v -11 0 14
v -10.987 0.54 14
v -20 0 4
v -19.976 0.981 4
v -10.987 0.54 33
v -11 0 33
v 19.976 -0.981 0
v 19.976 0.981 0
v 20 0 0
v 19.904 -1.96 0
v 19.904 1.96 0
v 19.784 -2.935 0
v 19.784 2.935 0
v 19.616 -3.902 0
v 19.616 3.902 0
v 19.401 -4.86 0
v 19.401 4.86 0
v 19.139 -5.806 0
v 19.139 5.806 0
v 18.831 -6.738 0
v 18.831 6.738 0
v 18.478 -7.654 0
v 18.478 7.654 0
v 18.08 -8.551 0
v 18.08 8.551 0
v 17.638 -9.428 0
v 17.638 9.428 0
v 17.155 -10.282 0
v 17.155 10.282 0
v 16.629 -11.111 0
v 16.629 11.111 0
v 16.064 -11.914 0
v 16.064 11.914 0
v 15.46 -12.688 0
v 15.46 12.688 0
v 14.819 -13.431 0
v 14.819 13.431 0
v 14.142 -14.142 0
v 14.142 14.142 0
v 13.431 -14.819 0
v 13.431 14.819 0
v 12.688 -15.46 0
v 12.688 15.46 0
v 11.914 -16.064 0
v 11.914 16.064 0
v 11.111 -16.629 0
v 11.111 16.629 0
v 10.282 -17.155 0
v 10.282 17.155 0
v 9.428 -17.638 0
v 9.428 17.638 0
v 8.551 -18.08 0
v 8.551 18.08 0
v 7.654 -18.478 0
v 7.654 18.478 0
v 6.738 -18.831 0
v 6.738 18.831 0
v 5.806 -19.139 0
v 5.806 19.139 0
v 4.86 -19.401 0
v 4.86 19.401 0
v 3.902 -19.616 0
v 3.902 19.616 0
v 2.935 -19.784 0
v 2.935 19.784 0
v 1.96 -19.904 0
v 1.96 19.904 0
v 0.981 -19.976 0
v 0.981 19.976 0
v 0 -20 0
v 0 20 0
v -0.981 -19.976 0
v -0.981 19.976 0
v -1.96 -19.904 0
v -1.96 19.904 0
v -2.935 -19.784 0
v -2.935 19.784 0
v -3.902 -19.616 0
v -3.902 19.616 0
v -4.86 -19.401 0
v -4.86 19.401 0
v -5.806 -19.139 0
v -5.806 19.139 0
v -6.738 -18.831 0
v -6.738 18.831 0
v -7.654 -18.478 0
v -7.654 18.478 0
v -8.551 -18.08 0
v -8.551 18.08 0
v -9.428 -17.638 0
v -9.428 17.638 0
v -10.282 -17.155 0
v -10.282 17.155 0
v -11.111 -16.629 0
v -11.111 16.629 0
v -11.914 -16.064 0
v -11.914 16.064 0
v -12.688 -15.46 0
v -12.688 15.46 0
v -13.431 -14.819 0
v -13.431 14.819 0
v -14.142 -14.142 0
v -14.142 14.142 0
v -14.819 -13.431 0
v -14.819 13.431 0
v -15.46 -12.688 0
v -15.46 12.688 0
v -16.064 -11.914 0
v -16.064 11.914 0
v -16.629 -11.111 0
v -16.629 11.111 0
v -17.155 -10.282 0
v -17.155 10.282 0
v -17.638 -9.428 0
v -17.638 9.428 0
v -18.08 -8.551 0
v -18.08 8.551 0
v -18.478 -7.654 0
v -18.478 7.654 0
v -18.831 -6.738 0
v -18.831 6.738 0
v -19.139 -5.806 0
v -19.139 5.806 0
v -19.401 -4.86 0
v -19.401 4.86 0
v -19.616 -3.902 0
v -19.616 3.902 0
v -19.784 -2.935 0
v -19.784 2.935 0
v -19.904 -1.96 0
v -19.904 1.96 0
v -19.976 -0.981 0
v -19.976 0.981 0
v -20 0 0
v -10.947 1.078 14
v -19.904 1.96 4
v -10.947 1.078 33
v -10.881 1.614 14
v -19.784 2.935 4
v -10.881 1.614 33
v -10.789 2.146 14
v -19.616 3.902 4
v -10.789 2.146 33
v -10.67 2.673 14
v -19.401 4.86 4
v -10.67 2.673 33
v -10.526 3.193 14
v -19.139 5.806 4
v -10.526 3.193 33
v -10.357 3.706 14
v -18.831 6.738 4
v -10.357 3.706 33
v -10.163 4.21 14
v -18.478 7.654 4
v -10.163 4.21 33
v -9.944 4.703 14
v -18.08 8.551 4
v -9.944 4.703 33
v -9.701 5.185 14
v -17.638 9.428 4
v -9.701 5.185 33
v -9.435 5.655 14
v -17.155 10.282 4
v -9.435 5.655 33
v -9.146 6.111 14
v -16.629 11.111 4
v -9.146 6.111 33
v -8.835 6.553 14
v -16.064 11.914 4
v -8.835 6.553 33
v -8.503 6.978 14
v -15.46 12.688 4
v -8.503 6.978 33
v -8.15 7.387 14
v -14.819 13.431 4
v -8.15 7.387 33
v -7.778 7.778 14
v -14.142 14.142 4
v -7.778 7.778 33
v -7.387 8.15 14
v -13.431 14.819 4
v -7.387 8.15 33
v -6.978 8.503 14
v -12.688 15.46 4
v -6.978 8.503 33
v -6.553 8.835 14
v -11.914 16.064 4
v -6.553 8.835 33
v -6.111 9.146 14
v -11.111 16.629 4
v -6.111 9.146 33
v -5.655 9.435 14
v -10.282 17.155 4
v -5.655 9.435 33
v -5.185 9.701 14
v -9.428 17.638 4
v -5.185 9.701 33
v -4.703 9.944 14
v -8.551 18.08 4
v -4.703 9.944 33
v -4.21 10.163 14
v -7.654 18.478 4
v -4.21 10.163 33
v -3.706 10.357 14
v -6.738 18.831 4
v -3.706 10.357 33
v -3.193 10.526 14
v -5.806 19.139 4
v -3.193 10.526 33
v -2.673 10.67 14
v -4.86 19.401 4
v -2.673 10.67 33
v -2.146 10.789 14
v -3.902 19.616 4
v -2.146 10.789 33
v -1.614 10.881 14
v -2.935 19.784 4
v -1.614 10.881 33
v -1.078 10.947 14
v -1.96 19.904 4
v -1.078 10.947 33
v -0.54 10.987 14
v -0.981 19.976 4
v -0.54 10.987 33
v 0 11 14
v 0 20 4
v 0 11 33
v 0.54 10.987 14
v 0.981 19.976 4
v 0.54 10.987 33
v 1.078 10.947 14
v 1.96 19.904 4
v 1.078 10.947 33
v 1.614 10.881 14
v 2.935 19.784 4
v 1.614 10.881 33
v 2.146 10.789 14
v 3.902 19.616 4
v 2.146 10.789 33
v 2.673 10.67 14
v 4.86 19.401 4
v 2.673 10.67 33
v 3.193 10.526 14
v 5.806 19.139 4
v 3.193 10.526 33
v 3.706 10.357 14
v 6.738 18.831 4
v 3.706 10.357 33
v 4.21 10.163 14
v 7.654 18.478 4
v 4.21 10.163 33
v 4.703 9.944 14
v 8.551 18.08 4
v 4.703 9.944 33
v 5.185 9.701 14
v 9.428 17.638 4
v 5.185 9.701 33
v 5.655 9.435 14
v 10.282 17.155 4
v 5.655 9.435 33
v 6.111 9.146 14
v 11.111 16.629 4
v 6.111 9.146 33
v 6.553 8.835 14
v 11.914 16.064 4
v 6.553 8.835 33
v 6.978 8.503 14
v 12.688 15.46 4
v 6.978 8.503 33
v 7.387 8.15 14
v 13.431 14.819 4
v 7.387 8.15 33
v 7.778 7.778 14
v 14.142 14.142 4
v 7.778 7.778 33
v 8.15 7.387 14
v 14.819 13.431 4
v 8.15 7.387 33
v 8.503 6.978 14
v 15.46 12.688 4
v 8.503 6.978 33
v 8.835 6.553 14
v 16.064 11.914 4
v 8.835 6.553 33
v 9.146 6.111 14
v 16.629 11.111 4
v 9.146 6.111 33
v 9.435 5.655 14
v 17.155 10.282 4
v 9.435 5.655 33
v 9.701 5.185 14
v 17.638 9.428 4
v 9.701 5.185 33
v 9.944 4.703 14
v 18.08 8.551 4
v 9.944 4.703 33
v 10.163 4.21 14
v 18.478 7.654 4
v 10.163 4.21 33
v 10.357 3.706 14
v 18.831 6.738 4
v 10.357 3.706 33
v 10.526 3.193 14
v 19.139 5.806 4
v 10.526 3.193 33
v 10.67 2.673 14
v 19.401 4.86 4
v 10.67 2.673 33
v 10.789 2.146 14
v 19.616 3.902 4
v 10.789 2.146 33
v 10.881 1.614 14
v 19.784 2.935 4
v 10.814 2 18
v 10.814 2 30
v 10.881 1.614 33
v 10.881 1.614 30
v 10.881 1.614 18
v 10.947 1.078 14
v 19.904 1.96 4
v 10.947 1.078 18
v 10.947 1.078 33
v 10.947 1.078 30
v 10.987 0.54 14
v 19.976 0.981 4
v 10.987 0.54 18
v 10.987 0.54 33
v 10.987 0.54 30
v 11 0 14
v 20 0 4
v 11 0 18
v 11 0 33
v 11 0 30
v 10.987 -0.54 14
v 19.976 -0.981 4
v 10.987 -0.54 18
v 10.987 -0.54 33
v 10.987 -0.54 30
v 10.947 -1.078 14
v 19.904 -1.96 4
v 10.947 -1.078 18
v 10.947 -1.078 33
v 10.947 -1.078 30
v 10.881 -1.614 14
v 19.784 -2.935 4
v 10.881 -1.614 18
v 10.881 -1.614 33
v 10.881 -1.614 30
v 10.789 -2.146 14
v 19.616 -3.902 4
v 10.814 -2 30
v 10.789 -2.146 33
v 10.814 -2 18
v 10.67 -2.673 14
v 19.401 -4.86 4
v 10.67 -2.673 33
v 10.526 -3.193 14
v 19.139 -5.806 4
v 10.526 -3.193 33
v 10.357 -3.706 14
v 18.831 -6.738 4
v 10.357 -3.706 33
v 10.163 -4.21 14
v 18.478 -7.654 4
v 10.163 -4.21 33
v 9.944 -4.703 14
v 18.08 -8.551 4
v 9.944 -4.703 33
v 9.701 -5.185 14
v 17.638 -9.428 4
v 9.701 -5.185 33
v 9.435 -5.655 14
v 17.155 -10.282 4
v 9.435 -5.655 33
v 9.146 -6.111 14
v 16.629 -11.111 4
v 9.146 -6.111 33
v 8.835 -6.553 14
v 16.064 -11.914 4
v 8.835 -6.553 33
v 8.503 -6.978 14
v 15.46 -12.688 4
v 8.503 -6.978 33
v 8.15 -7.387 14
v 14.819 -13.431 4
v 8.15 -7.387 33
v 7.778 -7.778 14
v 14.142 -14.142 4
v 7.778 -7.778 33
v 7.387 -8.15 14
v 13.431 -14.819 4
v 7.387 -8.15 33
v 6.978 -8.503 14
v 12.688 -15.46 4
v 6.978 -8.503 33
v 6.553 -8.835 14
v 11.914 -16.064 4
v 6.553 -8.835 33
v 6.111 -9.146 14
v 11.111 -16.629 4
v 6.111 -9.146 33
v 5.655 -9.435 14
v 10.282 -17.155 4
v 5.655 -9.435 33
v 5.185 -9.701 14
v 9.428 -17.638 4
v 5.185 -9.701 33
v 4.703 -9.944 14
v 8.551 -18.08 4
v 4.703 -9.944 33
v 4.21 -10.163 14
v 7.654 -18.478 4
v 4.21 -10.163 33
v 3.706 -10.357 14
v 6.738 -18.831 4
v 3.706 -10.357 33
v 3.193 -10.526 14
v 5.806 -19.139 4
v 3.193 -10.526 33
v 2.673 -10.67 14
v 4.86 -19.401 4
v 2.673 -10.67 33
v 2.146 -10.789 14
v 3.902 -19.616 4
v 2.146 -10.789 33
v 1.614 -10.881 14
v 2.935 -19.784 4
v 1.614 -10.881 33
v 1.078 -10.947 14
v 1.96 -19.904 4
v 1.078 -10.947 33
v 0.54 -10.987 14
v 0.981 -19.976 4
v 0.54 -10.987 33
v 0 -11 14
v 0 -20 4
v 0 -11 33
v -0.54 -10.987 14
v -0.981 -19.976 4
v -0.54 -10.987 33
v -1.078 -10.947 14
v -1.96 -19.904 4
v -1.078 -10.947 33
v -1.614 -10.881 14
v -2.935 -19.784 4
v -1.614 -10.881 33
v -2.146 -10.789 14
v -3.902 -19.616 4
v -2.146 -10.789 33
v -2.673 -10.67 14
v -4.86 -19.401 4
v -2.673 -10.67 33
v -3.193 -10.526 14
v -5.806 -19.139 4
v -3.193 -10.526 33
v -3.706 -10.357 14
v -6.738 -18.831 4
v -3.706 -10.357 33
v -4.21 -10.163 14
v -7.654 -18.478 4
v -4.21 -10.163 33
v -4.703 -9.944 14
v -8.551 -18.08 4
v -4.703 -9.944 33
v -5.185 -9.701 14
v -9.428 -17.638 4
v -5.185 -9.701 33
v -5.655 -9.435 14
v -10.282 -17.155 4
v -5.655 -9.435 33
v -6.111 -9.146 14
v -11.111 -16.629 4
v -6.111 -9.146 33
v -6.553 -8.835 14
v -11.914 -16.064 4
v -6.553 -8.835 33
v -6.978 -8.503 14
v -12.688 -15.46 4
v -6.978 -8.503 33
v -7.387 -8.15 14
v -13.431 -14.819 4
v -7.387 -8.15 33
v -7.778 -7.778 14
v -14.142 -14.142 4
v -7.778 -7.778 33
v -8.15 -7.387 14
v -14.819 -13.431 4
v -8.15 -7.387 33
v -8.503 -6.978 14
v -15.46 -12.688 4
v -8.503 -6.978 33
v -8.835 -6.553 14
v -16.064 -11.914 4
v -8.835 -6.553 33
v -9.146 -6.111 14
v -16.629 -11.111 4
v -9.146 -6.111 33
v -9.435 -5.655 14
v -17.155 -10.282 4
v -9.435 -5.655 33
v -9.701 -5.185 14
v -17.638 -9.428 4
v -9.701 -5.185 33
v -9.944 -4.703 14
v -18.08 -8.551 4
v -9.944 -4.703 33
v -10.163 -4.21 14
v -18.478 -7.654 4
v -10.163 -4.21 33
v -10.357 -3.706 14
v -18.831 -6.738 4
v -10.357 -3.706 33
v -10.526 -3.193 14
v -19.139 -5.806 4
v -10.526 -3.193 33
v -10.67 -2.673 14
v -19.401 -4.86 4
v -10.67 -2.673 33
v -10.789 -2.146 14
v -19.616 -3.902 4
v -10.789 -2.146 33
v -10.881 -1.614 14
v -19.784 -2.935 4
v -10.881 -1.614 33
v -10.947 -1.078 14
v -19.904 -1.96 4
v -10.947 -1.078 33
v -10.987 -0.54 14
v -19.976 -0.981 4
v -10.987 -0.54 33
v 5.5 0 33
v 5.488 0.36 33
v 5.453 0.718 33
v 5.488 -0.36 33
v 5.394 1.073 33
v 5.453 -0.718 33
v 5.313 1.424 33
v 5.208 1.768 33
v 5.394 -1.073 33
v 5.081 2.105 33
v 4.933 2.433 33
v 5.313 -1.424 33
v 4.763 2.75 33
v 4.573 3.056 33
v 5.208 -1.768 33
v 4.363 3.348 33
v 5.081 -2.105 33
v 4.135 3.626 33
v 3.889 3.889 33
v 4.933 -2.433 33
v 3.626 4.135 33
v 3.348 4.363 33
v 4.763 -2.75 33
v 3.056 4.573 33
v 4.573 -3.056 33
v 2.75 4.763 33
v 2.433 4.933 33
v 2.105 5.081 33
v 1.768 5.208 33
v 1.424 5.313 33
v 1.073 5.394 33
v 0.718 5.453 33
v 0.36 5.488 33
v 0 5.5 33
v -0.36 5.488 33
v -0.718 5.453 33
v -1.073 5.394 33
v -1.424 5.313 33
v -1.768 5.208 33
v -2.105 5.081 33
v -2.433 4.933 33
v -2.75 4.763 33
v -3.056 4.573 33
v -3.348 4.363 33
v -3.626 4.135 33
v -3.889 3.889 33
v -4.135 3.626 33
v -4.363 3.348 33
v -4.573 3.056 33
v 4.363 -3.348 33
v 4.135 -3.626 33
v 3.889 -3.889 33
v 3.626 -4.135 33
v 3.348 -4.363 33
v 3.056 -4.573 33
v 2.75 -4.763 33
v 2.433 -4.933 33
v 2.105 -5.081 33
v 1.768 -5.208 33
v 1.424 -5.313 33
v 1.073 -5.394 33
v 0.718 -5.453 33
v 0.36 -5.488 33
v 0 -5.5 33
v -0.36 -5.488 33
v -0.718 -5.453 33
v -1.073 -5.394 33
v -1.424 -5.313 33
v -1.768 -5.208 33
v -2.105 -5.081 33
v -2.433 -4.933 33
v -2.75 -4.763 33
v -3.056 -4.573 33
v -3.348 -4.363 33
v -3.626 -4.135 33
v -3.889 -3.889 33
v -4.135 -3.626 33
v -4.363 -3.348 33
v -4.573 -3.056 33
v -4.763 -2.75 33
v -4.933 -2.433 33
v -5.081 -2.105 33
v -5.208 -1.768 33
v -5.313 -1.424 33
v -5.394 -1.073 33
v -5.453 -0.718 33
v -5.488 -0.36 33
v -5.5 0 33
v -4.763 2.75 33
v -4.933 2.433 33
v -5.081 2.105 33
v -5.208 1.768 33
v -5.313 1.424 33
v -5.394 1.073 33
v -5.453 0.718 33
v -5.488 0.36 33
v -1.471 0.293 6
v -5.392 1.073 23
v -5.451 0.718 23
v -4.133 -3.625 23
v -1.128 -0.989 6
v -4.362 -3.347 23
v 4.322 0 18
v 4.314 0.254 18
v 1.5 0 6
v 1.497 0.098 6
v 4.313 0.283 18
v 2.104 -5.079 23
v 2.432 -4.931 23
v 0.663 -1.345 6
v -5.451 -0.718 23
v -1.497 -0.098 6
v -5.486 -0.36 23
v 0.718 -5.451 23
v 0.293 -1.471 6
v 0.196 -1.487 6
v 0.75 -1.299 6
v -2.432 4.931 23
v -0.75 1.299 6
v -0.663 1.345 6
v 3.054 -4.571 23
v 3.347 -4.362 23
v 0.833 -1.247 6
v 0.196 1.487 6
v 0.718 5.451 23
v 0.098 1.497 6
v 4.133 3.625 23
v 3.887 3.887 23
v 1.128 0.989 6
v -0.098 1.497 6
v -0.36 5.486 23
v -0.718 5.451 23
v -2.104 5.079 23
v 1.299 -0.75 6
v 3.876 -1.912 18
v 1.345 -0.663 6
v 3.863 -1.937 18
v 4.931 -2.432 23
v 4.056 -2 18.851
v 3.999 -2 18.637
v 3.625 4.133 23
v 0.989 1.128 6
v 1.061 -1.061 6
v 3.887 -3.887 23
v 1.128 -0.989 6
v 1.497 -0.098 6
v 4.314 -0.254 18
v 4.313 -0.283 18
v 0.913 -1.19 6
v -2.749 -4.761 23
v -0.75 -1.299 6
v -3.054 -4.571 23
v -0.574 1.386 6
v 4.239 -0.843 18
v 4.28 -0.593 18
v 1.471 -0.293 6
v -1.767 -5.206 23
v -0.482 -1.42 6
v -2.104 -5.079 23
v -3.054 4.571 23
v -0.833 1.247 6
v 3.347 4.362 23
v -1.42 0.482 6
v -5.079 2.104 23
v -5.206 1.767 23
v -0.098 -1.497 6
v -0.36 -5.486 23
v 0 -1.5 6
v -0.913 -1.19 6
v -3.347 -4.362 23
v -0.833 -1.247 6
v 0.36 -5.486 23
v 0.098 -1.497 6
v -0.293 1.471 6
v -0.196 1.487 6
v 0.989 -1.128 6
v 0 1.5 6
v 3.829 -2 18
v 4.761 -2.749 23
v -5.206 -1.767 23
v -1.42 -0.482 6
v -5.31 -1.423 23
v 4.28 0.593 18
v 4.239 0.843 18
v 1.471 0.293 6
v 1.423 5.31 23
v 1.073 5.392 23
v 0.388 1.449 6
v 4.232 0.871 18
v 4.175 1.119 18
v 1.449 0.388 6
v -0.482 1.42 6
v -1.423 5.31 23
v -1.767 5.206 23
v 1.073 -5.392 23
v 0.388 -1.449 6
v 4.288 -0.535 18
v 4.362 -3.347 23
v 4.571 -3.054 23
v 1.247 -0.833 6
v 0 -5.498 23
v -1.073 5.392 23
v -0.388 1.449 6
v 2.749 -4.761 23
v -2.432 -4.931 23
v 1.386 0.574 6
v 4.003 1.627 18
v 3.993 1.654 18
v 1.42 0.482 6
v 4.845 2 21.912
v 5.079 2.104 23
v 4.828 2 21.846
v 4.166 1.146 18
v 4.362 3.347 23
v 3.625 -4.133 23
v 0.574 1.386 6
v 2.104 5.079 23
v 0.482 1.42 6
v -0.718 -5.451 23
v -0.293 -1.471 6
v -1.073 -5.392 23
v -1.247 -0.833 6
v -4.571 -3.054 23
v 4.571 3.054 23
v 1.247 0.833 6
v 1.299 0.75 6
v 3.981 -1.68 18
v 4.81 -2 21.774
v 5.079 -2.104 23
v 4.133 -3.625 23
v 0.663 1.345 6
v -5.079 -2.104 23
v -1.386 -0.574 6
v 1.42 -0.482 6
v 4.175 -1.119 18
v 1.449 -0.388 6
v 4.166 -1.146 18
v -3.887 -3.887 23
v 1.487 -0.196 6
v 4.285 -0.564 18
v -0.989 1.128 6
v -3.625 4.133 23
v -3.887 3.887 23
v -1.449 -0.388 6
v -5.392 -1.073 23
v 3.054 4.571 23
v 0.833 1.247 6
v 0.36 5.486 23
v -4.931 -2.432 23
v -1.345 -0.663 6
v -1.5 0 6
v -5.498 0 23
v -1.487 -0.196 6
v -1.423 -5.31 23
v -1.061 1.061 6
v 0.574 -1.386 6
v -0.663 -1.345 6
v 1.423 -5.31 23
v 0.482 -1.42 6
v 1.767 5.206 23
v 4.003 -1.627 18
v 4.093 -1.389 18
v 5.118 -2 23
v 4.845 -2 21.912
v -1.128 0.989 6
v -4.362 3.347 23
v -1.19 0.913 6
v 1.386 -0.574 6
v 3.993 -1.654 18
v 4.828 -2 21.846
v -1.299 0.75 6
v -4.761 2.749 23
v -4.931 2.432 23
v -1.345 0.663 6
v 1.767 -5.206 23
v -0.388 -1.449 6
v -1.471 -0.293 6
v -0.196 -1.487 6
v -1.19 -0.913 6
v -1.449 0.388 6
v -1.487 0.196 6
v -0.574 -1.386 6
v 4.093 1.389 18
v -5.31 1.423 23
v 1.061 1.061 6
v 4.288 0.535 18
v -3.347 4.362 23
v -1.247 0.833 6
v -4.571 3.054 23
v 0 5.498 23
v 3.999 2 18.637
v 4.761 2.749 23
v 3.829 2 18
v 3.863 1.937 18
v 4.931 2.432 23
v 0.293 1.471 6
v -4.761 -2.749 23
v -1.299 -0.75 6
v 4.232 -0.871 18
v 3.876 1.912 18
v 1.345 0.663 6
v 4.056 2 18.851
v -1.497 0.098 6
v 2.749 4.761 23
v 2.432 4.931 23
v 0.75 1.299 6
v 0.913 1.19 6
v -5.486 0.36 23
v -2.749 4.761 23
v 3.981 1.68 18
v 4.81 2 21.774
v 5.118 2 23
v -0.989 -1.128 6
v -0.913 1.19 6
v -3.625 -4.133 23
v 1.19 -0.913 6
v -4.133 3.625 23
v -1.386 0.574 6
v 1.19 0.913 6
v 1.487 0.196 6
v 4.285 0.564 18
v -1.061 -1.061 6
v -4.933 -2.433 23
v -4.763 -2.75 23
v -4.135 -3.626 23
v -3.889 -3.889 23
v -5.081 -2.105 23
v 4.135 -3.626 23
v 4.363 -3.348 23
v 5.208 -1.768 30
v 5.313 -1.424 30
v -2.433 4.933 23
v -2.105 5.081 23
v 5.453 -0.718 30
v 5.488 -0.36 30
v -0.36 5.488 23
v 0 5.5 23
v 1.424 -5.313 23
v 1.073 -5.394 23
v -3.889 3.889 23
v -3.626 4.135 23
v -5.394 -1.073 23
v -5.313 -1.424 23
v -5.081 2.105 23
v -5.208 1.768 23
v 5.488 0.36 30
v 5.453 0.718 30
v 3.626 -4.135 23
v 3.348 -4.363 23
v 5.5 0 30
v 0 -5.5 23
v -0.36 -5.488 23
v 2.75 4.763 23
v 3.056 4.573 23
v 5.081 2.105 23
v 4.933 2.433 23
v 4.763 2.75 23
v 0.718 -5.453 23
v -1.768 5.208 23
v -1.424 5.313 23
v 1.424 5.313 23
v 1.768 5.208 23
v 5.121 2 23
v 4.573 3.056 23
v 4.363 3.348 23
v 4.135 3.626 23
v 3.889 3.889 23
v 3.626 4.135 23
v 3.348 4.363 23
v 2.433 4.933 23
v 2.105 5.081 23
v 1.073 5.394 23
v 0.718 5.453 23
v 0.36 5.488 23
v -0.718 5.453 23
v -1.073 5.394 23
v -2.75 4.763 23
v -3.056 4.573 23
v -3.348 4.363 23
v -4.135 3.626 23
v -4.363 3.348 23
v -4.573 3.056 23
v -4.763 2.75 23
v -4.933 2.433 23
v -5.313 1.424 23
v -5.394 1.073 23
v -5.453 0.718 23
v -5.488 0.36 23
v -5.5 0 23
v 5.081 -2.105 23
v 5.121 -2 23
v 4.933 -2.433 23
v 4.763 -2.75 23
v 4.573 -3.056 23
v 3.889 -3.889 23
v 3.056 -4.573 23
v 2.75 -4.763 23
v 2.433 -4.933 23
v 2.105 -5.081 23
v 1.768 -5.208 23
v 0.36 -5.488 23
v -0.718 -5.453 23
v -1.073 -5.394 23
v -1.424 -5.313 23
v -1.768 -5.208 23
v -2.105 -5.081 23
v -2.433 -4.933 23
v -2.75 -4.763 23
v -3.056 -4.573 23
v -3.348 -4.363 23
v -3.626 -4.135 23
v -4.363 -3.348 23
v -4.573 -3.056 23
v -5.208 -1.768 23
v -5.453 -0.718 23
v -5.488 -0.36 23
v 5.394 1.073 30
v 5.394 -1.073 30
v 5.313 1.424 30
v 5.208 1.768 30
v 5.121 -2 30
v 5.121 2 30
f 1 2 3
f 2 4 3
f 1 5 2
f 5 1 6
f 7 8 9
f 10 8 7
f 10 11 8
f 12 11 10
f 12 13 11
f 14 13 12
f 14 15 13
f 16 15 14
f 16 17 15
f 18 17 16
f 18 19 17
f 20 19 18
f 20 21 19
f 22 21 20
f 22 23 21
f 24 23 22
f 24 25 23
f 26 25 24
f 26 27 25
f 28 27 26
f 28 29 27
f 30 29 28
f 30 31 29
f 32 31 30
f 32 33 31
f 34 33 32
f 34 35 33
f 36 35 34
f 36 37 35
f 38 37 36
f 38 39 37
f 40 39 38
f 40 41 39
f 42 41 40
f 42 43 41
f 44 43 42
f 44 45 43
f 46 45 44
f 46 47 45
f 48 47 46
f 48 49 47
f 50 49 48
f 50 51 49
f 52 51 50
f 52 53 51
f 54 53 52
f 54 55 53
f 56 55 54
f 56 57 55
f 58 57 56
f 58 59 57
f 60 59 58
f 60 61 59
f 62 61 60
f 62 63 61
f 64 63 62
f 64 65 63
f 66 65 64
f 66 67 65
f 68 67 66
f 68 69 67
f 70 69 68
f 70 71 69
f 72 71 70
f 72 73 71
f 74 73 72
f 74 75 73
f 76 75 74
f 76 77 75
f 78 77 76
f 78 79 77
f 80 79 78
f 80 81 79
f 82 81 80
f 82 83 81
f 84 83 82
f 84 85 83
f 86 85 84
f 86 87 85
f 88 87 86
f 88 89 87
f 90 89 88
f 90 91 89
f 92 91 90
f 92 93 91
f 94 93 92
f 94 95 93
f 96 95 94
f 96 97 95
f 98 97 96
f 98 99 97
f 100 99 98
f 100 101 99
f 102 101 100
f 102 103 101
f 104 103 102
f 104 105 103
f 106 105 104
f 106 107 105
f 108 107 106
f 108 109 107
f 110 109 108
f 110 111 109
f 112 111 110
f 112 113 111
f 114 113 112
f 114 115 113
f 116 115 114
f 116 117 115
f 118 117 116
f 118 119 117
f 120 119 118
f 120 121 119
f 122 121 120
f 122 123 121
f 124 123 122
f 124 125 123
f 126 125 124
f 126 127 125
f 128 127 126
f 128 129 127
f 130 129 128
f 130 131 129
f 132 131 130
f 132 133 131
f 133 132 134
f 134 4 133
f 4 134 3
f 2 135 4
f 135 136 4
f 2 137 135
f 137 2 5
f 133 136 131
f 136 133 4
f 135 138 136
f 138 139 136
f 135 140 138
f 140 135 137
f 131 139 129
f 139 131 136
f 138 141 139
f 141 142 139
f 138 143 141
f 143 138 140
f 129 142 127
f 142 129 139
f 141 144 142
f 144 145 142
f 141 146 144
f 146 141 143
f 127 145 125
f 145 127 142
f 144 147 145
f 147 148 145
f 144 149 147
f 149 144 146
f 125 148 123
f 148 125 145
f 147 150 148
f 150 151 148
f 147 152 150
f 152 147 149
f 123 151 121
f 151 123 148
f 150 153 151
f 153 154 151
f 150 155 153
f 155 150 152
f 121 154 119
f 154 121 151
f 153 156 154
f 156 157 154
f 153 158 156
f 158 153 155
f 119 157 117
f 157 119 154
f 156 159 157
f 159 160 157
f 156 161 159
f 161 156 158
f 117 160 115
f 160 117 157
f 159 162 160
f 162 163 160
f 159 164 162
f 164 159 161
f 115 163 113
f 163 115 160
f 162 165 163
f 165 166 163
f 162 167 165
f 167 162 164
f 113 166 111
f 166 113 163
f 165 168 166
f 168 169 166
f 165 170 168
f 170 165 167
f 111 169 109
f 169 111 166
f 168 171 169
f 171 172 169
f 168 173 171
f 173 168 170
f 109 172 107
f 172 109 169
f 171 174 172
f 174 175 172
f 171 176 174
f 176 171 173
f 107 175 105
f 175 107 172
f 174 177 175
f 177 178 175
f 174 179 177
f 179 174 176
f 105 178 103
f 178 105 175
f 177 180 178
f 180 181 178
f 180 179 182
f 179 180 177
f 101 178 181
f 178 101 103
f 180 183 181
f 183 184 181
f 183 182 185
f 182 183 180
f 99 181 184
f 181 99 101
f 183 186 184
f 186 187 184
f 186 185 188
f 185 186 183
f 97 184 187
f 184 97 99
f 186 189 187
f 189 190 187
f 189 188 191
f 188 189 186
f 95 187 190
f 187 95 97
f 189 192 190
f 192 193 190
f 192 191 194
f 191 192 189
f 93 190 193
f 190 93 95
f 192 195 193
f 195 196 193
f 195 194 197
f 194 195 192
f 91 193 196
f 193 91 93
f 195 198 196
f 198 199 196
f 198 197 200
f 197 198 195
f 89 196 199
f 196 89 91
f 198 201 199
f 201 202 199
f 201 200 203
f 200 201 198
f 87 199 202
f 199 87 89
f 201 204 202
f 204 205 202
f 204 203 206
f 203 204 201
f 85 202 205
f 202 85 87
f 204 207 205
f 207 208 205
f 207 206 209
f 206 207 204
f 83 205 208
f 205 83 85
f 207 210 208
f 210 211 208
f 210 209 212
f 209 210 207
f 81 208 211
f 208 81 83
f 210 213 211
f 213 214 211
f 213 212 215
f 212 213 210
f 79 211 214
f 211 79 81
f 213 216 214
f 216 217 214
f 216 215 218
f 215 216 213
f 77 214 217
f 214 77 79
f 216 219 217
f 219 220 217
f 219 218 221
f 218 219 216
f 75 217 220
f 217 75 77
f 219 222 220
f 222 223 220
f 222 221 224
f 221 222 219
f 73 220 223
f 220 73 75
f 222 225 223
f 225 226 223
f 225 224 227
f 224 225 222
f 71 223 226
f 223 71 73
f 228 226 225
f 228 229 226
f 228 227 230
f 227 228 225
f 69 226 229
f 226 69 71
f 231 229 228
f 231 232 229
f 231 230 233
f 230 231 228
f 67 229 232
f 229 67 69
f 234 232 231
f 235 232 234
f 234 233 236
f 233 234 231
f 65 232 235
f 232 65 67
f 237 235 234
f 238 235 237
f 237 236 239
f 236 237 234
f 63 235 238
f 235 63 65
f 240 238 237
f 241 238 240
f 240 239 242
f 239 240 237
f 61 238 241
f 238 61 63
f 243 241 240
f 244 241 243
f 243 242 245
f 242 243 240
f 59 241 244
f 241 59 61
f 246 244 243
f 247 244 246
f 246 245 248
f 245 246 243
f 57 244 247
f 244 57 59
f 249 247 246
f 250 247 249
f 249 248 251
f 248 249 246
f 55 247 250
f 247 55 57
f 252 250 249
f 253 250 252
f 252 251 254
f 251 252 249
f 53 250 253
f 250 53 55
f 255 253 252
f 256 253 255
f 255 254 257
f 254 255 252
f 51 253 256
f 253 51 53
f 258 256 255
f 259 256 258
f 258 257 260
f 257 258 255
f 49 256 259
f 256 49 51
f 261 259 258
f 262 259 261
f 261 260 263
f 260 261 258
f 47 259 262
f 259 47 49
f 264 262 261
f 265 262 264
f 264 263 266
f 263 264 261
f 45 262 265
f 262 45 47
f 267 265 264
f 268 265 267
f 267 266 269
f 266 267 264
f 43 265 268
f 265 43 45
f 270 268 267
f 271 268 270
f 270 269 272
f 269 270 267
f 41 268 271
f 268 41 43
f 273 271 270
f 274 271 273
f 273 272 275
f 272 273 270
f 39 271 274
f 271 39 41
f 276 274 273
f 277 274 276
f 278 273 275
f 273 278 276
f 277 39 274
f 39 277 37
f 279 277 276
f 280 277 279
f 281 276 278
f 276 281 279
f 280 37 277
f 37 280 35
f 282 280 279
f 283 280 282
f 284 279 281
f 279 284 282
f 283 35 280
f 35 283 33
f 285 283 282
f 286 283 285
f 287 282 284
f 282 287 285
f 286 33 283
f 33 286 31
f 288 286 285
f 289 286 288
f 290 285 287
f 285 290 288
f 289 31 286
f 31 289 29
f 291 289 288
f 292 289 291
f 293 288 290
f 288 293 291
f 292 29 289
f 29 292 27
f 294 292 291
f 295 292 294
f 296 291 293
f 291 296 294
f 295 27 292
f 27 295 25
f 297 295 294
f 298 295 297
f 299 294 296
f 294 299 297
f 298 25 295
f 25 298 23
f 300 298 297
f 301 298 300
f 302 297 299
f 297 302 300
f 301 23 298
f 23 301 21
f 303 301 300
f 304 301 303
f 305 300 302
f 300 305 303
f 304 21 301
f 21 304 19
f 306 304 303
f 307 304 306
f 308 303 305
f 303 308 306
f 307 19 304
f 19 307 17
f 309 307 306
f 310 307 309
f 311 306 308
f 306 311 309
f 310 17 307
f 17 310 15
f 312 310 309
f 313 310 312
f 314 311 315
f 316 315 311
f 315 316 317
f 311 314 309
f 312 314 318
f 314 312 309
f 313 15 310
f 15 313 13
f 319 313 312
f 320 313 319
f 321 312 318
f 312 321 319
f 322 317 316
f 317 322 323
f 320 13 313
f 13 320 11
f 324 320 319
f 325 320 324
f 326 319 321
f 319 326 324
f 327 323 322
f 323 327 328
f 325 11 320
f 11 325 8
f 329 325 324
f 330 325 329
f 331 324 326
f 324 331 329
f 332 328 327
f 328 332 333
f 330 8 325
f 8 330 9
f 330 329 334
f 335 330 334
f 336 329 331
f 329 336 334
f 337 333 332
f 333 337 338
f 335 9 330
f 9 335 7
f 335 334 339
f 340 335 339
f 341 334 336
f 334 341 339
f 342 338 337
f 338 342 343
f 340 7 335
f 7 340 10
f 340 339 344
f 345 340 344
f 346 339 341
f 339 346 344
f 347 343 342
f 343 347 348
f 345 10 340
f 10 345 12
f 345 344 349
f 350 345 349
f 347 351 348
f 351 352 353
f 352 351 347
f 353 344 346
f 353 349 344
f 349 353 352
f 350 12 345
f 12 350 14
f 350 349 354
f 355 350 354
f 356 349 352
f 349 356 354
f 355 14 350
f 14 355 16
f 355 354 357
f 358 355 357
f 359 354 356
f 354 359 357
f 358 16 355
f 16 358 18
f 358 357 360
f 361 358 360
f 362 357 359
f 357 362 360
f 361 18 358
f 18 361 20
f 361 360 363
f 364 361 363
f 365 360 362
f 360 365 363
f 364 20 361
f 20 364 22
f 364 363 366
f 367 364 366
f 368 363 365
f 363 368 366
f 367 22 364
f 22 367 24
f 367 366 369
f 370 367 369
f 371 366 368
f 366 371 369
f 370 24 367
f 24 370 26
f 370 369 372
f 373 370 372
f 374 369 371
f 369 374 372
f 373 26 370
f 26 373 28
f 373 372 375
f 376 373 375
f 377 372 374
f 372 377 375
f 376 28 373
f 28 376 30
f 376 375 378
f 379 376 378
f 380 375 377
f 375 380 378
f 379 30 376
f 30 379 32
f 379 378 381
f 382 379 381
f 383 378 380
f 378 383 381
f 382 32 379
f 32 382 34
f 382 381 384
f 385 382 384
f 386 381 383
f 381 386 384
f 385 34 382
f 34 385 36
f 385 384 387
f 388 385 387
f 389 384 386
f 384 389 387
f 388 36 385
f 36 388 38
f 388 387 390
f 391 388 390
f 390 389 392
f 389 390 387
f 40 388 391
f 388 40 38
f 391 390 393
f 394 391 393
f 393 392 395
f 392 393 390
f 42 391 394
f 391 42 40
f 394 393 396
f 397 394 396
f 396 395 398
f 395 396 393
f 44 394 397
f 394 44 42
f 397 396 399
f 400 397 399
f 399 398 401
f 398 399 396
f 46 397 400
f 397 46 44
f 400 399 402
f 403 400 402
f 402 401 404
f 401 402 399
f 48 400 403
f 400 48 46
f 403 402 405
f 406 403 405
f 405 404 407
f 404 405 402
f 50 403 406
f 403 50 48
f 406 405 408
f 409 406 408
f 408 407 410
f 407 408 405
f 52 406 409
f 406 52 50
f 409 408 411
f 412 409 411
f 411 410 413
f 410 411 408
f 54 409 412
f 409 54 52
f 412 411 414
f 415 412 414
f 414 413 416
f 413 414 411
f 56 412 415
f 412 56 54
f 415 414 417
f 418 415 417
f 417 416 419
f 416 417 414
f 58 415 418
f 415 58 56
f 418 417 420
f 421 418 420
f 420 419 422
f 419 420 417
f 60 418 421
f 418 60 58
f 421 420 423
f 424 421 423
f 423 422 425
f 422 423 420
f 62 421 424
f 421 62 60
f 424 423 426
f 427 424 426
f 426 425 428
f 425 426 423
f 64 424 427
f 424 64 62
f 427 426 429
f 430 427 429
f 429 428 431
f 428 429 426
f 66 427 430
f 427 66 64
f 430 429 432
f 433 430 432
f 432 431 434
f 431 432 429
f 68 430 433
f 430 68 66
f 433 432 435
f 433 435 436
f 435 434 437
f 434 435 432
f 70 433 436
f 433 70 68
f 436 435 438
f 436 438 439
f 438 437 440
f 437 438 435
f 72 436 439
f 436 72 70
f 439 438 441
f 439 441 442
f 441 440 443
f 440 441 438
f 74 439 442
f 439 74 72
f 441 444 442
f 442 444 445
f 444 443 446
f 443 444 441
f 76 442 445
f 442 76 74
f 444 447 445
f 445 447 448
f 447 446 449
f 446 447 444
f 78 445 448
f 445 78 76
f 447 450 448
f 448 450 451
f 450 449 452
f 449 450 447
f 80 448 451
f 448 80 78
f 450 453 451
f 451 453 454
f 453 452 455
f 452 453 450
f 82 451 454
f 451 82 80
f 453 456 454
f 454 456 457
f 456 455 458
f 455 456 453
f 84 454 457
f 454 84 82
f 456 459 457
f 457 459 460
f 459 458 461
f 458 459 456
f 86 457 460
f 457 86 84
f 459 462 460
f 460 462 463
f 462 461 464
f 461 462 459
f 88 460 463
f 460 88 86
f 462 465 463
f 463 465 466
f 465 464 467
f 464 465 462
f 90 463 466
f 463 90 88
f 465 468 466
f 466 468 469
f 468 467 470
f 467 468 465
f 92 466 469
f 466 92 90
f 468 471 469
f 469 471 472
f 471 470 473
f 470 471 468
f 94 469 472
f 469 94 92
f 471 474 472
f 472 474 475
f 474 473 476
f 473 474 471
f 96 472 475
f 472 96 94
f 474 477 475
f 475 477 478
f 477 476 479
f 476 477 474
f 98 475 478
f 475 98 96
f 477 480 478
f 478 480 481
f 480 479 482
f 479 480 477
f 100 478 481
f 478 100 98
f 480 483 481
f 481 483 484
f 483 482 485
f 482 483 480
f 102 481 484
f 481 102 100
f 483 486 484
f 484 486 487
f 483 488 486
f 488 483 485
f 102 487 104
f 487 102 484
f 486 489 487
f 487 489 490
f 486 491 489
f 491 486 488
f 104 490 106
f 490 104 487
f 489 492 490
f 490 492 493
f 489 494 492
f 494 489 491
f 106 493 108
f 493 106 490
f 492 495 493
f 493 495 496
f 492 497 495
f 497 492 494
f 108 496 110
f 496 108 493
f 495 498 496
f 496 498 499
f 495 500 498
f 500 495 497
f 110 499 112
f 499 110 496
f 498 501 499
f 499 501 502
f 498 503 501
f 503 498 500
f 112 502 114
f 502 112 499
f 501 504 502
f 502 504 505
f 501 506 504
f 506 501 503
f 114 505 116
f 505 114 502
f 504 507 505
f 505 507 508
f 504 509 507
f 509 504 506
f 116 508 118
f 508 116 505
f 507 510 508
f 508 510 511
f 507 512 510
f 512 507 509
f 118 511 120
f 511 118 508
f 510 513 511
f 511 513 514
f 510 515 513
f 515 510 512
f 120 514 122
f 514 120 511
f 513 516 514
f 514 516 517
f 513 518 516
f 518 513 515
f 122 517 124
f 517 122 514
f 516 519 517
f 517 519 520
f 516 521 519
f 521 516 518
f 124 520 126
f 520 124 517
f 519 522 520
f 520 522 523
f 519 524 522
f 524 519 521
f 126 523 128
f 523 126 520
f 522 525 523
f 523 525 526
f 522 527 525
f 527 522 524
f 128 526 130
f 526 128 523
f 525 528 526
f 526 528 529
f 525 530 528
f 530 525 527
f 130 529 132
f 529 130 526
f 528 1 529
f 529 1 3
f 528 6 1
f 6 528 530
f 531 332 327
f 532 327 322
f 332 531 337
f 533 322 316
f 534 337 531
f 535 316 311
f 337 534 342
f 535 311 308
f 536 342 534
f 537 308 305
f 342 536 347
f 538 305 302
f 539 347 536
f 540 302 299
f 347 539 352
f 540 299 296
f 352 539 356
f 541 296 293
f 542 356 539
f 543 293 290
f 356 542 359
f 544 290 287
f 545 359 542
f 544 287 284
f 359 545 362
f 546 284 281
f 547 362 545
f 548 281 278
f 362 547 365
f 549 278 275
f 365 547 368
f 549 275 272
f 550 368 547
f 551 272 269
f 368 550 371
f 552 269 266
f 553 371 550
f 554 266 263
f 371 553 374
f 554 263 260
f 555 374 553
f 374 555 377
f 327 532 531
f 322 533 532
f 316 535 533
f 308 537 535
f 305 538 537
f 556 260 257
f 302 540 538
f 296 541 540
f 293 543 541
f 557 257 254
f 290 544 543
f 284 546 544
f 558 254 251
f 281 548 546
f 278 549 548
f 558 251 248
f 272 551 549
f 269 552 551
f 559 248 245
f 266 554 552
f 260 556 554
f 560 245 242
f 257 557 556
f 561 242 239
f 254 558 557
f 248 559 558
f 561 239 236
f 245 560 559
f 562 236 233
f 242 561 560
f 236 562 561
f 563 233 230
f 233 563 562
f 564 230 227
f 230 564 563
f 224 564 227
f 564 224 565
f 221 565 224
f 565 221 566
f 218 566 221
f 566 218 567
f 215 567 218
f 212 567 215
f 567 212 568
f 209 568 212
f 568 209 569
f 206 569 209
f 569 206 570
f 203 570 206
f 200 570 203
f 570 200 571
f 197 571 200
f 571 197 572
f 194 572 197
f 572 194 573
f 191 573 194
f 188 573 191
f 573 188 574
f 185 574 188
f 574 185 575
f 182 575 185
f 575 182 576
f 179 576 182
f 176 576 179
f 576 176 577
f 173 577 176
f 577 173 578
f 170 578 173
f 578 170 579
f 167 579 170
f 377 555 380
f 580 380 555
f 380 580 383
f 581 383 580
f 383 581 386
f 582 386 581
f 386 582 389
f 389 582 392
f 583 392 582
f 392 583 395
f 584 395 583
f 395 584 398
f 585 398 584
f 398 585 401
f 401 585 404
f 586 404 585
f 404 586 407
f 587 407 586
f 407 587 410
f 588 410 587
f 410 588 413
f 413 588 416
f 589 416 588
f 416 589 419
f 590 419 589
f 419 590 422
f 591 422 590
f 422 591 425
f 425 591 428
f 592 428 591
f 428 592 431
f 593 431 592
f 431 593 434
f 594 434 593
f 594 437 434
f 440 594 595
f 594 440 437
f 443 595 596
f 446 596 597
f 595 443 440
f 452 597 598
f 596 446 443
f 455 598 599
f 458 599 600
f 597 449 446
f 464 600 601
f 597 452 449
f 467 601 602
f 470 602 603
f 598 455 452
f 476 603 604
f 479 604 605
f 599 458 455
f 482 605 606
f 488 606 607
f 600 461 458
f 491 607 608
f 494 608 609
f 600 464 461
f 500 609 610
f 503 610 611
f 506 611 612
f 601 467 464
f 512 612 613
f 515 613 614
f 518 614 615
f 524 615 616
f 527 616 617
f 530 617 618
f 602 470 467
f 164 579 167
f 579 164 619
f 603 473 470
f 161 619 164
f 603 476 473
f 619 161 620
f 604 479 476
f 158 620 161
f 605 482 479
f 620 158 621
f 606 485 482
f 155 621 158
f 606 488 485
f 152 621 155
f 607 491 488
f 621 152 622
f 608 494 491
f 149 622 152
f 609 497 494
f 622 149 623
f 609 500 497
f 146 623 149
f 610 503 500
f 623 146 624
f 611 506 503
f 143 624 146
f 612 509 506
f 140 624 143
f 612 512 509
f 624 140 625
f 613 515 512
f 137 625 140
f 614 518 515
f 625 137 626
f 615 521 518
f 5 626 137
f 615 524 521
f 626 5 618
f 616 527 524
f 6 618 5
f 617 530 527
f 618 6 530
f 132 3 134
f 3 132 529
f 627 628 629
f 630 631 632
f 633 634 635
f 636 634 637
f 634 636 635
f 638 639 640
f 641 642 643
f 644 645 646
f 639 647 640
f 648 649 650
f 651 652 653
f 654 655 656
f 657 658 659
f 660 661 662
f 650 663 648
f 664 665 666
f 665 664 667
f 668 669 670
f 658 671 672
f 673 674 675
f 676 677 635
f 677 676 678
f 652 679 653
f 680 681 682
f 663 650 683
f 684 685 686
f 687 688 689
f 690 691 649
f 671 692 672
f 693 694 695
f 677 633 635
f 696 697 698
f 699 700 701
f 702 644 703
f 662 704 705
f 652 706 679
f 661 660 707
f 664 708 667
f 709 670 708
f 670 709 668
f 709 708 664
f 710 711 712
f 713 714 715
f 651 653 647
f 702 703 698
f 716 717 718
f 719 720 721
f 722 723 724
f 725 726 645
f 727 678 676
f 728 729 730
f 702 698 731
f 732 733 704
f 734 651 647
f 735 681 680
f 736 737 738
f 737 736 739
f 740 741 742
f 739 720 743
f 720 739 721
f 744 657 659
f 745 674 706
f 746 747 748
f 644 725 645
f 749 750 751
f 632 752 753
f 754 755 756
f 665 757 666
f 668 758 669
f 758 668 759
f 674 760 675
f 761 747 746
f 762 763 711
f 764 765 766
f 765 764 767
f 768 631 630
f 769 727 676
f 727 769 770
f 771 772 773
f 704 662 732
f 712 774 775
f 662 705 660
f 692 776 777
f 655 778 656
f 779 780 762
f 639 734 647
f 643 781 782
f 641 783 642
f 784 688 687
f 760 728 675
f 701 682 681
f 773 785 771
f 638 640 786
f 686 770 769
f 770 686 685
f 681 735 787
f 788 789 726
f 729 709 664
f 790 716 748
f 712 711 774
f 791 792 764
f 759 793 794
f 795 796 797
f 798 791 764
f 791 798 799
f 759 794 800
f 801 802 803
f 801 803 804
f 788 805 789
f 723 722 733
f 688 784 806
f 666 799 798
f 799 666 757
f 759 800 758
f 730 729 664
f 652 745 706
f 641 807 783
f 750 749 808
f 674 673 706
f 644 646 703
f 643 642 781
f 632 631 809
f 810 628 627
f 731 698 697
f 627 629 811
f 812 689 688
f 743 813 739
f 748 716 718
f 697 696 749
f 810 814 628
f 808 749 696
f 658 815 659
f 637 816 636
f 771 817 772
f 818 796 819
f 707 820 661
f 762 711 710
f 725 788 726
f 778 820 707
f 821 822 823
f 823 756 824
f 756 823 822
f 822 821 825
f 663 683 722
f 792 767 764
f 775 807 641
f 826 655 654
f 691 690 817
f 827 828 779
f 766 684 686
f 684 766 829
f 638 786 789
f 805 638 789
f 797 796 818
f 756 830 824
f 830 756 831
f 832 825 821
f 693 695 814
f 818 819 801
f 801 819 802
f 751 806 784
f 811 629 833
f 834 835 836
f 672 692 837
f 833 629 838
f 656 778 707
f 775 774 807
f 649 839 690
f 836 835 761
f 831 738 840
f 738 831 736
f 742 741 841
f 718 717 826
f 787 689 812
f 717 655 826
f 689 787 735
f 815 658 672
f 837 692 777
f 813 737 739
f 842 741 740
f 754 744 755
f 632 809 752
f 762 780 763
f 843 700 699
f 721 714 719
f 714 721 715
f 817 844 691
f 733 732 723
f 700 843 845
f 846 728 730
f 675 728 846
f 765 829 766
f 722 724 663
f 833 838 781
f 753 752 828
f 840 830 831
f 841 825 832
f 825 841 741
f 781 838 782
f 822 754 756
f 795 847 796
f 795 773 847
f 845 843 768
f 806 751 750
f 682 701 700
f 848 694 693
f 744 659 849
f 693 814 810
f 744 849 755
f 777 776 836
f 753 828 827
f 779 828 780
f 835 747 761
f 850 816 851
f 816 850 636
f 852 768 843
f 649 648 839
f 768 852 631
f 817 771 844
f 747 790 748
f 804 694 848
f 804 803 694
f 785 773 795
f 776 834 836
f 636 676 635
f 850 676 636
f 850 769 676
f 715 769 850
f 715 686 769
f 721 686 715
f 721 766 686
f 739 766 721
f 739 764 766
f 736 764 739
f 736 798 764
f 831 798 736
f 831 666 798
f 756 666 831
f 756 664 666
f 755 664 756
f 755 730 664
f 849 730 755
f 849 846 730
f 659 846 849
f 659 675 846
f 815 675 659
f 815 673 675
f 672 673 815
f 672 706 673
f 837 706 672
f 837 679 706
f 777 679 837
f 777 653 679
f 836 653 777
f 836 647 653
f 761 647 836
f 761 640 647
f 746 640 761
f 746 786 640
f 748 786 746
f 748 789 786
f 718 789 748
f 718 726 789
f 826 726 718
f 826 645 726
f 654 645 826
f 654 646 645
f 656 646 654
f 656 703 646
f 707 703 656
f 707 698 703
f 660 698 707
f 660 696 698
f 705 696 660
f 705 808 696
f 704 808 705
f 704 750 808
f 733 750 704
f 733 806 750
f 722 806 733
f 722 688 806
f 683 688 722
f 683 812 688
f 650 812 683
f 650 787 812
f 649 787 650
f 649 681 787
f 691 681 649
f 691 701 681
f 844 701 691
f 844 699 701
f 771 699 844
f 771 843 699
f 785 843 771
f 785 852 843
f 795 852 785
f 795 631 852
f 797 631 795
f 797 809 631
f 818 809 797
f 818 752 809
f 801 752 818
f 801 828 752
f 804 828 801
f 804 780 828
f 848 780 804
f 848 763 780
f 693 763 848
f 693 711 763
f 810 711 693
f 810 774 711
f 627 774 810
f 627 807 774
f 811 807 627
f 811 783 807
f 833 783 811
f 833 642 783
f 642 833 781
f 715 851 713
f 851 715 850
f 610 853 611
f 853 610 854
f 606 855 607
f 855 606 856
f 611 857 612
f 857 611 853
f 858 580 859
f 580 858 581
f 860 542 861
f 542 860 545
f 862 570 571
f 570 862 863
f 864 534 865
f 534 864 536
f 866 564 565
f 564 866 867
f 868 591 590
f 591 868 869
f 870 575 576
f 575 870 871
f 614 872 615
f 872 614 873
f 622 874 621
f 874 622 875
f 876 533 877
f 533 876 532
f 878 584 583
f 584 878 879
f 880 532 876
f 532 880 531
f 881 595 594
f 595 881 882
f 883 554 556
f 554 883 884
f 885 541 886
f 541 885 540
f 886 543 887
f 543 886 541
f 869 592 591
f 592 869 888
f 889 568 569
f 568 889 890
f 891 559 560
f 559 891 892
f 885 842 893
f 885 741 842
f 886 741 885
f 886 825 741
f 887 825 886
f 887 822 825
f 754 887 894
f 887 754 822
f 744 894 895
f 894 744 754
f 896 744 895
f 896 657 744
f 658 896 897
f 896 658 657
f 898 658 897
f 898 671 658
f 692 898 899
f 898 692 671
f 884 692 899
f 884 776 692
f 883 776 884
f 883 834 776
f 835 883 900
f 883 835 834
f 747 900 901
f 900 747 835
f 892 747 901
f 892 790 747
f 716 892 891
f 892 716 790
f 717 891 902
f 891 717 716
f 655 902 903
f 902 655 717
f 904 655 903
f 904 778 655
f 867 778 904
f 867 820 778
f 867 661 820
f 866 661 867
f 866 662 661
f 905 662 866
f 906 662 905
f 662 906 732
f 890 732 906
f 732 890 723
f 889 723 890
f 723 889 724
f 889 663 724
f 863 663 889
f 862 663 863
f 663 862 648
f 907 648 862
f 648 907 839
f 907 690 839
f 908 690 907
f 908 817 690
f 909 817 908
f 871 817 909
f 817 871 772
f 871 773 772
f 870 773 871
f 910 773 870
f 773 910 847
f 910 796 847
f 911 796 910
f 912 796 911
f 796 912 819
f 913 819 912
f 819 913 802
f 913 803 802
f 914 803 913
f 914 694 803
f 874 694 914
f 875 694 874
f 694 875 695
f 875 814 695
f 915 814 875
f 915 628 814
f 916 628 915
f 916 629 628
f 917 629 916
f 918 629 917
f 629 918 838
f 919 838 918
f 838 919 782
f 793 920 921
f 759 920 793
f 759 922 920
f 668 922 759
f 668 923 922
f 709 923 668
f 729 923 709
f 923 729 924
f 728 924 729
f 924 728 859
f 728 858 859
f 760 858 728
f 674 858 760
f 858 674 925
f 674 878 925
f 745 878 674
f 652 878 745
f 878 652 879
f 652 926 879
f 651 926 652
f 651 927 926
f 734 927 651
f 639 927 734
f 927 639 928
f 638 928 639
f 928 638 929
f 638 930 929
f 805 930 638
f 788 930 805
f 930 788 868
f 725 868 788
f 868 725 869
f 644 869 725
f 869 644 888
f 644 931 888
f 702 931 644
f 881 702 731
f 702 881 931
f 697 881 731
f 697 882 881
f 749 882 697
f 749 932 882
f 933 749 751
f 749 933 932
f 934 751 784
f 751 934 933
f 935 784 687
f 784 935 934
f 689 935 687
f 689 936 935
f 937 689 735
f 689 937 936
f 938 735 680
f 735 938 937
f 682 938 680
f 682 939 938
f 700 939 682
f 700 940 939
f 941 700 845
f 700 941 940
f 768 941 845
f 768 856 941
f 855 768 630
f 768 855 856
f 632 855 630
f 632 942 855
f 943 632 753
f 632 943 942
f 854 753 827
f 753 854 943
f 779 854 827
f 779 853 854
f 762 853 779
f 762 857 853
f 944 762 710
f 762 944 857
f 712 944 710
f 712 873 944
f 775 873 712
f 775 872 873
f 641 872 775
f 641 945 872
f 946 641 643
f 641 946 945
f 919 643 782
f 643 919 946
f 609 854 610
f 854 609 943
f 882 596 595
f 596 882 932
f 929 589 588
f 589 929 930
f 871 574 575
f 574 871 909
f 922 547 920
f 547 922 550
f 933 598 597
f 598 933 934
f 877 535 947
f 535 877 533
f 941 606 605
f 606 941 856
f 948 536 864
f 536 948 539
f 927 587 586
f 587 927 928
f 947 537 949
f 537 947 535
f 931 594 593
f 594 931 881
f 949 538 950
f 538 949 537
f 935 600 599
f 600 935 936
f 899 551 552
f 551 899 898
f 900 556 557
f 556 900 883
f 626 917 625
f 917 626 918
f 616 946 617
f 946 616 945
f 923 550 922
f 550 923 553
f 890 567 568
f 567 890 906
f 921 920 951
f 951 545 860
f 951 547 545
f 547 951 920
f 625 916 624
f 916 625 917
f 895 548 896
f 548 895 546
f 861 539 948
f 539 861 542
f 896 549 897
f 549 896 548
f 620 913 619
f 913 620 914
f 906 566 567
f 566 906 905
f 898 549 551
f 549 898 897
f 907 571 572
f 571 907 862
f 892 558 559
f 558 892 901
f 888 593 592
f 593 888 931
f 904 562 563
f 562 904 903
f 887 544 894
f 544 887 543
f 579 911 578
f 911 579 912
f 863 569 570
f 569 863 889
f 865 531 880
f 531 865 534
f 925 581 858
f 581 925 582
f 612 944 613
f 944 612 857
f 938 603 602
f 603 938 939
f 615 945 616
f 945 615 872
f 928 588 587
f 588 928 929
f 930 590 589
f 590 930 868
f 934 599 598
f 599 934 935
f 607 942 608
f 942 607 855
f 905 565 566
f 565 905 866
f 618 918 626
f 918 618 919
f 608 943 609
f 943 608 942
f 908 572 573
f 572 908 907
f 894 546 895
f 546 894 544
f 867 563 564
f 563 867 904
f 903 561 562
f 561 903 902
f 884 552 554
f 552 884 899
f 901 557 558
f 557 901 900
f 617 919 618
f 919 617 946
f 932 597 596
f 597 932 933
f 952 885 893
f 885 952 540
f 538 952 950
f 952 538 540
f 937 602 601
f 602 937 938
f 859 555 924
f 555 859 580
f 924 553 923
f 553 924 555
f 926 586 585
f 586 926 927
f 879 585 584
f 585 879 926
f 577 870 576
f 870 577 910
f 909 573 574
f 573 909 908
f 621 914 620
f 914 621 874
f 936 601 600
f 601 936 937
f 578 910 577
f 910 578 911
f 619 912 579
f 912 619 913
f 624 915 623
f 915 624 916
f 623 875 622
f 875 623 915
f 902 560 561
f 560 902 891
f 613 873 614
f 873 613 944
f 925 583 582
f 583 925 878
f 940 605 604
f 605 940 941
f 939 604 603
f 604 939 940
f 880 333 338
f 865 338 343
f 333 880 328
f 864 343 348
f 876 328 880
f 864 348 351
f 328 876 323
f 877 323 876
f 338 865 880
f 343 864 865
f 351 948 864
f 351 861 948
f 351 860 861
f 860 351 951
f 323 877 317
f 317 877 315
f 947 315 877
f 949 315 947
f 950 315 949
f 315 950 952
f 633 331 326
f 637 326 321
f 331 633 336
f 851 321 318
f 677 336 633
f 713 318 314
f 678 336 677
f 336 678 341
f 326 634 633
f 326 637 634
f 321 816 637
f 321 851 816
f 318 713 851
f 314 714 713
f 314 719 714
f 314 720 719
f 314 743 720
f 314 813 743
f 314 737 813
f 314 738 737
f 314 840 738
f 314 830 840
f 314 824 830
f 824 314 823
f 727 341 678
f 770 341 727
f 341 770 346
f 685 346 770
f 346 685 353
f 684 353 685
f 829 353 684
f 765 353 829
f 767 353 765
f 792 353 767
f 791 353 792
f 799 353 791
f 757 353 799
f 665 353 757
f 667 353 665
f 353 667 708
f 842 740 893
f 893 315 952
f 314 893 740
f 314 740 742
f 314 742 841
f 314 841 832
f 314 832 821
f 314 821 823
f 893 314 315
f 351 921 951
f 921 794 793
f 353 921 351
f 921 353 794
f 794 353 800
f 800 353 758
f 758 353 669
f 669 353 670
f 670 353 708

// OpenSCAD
// KNOWN-WRONG PART (must fail): the base disc is 40 mm instead of 50
// Weighing stand that holds one 1.5 mL microcentrifuge tube upright on a balance pan
// Category: quick fixes. A revolved stand (base disc, cone, column) with a seat that follows the
// tube's conical tip, and a viewing window through the column wall on the +X side.
// Print: PLA or PETG, standing up, 0.2 mm layers. Tare the balance with the stand on it.
// SPDX-License-Identifier: CERN-OHL-P-2.0

/* [Stand] */
base_d = 40;  base_h = 4;       // disc z = 0 .. 4
col_d = 22;   cone_top = 14;    // cone 50 -> 22 mm from z = 4 to 14
height = 33;                    // column from z = 14 to 33
seat_d = 11;  seat_cyl_z = 23;  // 11 mm from the top down to z = 23 ...
tip_d = 3;    tip_z = 6;        // ... then a cone narrowing to 3 mm at z = 6
win_w = 4;    win_z = [18, 30]; // viewing window through the +X wall

/* [Hidden] */
$fn = 128;
eps = 0.01;

difference() {
    rotate_extrude() polygon([[0, 0], [base_d / 2, 0], [base_d / 2, base_h], [col_d / 2, cone_top],
                              [col_d / 2, height], [0, height]]);
    translate([0, 0, tip_z]) cylinder(d1 = tip_d, d2 = seat_d, h = seat_cyl_z - tip_z + eps, $fn = 96);
    translate([0, 0, seat_cyl_z]) cylinder(d = seat_d, h = height - seat_cyl_z + 1, $fn = 96);
    translate([0, -win_w / 2, win_z[0]]) cube([col_d / 2 + 1, win_w, win_z[1] - win_z[0]]);
}
